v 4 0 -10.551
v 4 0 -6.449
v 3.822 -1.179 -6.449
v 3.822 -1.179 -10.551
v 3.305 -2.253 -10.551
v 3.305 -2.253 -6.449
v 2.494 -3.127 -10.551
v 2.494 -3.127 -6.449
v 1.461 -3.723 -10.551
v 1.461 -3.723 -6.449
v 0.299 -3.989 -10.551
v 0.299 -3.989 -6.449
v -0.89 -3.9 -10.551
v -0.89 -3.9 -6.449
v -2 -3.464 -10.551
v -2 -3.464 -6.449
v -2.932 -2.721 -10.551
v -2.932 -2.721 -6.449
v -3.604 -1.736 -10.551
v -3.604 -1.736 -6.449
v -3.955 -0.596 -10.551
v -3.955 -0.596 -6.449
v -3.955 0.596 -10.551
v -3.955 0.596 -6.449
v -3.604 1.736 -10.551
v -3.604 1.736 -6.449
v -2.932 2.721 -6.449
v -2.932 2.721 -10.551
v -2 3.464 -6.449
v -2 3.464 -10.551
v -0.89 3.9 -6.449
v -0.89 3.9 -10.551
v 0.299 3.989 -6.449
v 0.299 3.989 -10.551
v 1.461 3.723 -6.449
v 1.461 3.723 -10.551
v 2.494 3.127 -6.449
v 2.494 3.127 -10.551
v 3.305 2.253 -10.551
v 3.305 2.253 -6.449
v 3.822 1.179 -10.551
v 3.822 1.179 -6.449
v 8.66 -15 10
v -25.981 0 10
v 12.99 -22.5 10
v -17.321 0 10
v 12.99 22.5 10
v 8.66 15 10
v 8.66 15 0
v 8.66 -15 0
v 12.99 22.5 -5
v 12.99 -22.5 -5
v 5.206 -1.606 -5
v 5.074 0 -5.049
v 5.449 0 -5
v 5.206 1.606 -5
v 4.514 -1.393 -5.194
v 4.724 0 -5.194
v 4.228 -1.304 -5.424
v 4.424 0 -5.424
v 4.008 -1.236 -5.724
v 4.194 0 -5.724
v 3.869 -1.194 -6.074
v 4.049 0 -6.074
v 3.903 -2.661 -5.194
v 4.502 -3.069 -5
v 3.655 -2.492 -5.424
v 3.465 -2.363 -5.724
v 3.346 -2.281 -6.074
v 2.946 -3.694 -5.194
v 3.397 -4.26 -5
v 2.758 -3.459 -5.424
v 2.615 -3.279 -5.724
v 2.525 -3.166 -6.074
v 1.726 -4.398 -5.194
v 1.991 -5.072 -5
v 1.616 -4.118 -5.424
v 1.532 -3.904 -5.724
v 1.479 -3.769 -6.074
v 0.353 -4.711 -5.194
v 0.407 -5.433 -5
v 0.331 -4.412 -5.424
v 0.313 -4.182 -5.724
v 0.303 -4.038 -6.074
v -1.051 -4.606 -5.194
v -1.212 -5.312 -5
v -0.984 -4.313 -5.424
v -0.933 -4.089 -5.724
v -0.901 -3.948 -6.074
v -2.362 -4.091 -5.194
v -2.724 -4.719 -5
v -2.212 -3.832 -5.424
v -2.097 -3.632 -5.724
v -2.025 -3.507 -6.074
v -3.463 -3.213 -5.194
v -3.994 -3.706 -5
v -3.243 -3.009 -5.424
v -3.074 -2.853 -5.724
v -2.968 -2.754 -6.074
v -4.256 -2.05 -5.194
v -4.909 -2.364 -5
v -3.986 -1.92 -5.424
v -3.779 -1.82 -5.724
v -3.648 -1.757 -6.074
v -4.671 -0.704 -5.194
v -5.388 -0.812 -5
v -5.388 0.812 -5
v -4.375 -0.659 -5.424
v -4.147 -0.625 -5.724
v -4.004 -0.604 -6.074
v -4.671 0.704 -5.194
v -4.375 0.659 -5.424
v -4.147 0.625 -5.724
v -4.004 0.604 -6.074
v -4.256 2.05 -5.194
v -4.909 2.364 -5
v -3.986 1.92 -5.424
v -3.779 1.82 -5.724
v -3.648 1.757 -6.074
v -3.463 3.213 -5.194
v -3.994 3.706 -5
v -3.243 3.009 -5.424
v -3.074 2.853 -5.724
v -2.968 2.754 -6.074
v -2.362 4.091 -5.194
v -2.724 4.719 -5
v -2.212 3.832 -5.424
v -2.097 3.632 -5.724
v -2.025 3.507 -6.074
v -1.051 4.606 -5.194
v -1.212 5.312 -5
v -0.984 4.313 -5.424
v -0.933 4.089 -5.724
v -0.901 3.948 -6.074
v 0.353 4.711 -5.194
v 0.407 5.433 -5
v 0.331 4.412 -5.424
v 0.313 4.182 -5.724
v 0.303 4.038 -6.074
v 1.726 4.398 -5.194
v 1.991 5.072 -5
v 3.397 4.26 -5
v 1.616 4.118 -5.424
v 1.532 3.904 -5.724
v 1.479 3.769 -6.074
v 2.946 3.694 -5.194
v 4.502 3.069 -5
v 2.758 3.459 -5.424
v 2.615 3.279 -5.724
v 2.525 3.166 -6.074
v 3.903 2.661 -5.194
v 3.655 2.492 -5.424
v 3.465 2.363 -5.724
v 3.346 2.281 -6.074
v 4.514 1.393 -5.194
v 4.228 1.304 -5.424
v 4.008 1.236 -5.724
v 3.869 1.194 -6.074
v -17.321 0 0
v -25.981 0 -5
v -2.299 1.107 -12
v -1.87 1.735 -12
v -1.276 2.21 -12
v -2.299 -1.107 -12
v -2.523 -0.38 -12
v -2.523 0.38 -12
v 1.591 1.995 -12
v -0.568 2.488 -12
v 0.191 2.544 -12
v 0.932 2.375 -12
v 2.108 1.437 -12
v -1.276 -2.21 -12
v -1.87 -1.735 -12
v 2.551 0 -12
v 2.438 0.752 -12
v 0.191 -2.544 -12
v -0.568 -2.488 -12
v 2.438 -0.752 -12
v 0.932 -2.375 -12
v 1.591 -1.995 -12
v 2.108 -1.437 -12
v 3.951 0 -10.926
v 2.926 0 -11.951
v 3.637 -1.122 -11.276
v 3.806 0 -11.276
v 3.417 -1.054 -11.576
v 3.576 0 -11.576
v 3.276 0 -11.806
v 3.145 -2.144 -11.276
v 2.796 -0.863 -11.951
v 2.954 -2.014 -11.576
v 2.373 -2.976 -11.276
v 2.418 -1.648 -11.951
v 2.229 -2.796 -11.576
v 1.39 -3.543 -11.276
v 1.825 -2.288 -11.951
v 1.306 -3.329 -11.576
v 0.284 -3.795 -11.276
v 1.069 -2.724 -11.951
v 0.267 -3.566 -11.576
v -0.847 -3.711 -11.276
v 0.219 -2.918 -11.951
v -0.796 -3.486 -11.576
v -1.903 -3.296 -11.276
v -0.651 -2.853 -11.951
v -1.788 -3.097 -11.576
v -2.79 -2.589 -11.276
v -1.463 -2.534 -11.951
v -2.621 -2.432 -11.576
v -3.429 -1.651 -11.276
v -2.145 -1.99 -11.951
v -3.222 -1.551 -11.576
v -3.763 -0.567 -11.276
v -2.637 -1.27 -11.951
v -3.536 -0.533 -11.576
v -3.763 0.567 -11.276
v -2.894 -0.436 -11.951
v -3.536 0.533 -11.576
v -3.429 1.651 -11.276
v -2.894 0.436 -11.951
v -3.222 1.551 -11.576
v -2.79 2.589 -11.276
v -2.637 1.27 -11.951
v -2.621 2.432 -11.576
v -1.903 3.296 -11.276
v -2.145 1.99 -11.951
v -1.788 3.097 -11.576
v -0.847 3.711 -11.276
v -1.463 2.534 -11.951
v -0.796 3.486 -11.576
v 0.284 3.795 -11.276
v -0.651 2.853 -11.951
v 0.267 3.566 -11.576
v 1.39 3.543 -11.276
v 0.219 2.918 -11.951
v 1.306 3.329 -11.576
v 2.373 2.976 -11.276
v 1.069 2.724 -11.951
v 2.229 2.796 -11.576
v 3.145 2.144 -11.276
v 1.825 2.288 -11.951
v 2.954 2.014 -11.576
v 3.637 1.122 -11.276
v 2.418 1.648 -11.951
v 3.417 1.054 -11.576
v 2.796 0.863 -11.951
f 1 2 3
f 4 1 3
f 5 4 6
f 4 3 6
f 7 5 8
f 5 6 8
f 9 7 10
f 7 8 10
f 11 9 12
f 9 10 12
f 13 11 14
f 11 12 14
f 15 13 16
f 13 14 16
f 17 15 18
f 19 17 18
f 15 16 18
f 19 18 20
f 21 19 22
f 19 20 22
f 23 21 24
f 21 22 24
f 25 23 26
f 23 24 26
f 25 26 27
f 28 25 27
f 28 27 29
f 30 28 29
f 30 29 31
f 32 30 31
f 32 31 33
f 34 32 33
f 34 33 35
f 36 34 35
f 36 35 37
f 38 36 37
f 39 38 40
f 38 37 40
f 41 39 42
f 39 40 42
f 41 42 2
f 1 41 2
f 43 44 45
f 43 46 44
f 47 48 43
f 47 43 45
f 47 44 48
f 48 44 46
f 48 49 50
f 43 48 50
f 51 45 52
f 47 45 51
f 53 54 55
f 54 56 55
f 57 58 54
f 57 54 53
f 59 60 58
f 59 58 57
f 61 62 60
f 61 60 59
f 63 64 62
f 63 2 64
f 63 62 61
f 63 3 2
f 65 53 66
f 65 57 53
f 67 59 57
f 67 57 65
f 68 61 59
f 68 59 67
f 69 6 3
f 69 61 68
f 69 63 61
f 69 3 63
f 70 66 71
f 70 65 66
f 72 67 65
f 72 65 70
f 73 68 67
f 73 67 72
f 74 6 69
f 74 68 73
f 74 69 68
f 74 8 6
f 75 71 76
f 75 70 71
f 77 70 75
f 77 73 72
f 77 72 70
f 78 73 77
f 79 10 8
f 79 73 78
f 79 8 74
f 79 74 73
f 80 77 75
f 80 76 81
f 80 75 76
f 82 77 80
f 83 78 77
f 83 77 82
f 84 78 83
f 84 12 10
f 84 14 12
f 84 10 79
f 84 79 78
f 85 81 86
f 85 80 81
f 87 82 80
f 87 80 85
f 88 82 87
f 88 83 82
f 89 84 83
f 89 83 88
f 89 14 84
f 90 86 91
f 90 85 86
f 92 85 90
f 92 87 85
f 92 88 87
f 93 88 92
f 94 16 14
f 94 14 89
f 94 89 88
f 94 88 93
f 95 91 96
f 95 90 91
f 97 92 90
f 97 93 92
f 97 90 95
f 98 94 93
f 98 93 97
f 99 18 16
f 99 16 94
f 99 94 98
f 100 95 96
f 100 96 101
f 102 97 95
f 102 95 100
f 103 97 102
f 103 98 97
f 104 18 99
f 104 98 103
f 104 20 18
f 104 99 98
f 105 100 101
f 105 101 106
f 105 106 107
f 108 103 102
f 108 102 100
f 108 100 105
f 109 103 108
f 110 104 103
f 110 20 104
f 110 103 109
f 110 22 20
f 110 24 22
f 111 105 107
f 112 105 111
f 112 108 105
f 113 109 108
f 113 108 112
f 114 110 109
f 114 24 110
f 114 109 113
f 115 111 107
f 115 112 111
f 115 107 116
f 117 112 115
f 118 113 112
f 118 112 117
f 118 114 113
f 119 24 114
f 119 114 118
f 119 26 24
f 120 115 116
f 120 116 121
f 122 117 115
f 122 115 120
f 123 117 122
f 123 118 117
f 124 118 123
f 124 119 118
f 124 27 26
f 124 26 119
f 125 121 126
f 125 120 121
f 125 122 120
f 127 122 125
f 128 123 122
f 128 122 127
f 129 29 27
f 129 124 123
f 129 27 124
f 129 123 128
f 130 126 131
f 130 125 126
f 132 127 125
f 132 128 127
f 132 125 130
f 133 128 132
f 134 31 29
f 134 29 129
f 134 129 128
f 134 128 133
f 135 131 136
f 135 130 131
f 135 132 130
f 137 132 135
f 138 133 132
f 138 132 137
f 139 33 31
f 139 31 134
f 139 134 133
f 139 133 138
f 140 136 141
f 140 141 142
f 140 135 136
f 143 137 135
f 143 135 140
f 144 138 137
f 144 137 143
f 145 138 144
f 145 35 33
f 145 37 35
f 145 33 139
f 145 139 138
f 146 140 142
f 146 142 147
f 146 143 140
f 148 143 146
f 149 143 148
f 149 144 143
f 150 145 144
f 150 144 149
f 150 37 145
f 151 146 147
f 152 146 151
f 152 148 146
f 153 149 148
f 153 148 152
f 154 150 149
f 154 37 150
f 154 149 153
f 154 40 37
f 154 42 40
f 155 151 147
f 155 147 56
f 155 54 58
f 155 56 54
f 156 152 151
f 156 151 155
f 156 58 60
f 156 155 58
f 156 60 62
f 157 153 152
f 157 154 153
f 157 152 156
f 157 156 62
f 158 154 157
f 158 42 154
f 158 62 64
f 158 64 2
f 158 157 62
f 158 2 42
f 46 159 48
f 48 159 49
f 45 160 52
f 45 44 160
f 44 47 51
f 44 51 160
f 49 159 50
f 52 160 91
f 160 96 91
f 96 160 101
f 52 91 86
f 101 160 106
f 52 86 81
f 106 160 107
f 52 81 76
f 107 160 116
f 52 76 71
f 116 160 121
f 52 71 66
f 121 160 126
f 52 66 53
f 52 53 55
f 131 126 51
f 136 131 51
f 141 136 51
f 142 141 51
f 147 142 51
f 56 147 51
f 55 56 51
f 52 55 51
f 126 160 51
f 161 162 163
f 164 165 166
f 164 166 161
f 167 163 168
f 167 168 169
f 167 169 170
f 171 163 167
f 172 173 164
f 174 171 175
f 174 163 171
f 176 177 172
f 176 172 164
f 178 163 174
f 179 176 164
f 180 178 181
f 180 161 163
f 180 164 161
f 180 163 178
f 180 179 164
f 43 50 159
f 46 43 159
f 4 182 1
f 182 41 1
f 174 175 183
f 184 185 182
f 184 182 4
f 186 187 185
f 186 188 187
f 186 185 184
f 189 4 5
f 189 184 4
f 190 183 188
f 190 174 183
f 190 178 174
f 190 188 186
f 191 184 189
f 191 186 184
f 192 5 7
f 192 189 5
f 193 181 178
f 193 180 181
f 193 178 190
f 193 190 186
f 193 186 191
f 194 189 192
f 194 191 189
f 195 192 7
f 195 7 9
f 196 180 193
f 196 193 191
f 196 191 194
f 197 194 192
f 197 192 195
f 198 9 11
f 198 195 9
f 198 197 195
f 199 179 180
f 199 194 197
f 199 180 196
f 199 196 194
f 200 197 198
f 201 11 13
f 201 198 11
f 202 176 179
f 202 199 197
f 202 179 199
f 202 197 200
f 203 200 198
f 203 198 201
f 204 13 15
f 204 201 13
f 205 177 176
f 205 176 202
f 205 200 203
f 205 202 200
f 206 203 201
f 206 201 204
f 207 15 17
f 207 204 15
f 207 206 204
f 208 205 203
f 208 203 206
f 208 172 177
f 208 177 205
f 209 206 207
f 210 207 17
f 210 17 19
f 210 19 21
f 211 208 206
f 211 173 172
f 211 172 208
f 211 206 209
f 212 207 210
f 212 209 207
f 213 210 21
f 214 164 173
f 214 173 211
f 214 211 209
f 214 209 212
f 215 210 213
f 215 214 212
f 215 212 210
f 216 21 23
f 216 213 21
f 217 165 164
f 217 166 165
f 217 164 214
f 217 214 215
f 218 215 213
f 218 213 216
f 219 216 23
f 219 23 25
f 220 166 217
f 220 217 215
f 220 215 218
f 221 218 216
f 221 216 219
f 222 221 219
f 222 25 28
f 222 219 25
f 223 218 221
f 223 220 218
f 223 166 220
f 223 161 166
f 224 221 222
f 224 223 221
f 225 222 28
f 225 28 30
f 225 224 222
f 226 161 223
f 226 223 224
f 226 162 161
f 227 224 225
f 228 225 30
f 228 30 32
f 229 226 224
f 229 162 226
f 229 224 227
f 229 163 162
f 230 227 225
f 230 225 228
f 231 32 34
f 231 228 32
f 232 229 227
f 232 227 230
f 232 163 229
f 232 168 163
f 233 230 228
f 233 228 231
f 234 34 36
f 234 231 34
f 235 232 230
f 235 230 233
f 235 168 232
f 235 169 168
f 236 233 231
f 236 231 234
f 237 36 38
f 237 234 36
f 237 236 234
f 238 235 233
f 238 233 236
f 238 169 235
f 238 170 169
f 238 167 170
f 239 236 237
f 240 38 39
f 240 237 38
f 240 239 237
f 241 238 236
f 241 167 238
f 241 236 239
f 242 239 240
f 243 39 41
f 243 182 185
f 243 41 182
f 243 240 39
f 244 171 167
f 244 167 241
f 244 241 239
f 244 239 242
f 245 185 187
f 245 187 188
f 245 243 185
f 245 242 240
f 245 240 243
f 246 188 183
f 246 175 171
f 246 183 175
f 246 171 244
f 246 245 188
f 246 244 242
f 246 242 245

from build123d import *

# Parameters (mm, degrees)
F1_DEPTH = 10
F2_DEPTH = 5
F3_R     = 4
F4_DEPTH = 7
F5_R     = 1.448528


with BuildPart() as f1:
    # F0 (on Top) → F1 (new body)
    with BuildSketch(Plane.XY):
        Polygon((12.990381, -22.5), (12.990381, 22.5), (-25.980762, 0), align=None)
        Polygon((-17.320508, 0), (8.660254, 15), (8.660254, -15), align=None, mode=Mode.SUBTRACT)
    extrude(amount=F1_DEPTH)

    # F0 (on Top) → F2 (join)
    with BuildSketch(Plane.XY):
        Polygon((12.990381, -22.5), (12.990381, 22.5), (-25.980762, 0), align=None)
        Polygon((-17.320508, 0), (8.660254, 15), (8.660254, -15), align=None, mode=Mode.SUBTRACT)
        Polygon((8.660254, -15), (8.660254, 15), (-17.320508, 0), align=None)
    extrude(amount=-F2_DEPTH)

    # F3 (on face) → F4 (join)
    with BuildSketch(Plane(origin=(0, 0, -5), x_dir=(1, 0, 0), z_dir=(0, 0, -1))):
        Circle(F3_R)
    extrude(amount=F4_DEPTH)

    # F5
    f5_edges = [f1.edges().sort_by_distance(p)[0] for p in [
        (4, 0, -8.5),
        (-4, 0, -5),
        (-4, 0, -12),
    ]]
    fillet(f5_edges, radius=F5_R)


solid = f1.part
